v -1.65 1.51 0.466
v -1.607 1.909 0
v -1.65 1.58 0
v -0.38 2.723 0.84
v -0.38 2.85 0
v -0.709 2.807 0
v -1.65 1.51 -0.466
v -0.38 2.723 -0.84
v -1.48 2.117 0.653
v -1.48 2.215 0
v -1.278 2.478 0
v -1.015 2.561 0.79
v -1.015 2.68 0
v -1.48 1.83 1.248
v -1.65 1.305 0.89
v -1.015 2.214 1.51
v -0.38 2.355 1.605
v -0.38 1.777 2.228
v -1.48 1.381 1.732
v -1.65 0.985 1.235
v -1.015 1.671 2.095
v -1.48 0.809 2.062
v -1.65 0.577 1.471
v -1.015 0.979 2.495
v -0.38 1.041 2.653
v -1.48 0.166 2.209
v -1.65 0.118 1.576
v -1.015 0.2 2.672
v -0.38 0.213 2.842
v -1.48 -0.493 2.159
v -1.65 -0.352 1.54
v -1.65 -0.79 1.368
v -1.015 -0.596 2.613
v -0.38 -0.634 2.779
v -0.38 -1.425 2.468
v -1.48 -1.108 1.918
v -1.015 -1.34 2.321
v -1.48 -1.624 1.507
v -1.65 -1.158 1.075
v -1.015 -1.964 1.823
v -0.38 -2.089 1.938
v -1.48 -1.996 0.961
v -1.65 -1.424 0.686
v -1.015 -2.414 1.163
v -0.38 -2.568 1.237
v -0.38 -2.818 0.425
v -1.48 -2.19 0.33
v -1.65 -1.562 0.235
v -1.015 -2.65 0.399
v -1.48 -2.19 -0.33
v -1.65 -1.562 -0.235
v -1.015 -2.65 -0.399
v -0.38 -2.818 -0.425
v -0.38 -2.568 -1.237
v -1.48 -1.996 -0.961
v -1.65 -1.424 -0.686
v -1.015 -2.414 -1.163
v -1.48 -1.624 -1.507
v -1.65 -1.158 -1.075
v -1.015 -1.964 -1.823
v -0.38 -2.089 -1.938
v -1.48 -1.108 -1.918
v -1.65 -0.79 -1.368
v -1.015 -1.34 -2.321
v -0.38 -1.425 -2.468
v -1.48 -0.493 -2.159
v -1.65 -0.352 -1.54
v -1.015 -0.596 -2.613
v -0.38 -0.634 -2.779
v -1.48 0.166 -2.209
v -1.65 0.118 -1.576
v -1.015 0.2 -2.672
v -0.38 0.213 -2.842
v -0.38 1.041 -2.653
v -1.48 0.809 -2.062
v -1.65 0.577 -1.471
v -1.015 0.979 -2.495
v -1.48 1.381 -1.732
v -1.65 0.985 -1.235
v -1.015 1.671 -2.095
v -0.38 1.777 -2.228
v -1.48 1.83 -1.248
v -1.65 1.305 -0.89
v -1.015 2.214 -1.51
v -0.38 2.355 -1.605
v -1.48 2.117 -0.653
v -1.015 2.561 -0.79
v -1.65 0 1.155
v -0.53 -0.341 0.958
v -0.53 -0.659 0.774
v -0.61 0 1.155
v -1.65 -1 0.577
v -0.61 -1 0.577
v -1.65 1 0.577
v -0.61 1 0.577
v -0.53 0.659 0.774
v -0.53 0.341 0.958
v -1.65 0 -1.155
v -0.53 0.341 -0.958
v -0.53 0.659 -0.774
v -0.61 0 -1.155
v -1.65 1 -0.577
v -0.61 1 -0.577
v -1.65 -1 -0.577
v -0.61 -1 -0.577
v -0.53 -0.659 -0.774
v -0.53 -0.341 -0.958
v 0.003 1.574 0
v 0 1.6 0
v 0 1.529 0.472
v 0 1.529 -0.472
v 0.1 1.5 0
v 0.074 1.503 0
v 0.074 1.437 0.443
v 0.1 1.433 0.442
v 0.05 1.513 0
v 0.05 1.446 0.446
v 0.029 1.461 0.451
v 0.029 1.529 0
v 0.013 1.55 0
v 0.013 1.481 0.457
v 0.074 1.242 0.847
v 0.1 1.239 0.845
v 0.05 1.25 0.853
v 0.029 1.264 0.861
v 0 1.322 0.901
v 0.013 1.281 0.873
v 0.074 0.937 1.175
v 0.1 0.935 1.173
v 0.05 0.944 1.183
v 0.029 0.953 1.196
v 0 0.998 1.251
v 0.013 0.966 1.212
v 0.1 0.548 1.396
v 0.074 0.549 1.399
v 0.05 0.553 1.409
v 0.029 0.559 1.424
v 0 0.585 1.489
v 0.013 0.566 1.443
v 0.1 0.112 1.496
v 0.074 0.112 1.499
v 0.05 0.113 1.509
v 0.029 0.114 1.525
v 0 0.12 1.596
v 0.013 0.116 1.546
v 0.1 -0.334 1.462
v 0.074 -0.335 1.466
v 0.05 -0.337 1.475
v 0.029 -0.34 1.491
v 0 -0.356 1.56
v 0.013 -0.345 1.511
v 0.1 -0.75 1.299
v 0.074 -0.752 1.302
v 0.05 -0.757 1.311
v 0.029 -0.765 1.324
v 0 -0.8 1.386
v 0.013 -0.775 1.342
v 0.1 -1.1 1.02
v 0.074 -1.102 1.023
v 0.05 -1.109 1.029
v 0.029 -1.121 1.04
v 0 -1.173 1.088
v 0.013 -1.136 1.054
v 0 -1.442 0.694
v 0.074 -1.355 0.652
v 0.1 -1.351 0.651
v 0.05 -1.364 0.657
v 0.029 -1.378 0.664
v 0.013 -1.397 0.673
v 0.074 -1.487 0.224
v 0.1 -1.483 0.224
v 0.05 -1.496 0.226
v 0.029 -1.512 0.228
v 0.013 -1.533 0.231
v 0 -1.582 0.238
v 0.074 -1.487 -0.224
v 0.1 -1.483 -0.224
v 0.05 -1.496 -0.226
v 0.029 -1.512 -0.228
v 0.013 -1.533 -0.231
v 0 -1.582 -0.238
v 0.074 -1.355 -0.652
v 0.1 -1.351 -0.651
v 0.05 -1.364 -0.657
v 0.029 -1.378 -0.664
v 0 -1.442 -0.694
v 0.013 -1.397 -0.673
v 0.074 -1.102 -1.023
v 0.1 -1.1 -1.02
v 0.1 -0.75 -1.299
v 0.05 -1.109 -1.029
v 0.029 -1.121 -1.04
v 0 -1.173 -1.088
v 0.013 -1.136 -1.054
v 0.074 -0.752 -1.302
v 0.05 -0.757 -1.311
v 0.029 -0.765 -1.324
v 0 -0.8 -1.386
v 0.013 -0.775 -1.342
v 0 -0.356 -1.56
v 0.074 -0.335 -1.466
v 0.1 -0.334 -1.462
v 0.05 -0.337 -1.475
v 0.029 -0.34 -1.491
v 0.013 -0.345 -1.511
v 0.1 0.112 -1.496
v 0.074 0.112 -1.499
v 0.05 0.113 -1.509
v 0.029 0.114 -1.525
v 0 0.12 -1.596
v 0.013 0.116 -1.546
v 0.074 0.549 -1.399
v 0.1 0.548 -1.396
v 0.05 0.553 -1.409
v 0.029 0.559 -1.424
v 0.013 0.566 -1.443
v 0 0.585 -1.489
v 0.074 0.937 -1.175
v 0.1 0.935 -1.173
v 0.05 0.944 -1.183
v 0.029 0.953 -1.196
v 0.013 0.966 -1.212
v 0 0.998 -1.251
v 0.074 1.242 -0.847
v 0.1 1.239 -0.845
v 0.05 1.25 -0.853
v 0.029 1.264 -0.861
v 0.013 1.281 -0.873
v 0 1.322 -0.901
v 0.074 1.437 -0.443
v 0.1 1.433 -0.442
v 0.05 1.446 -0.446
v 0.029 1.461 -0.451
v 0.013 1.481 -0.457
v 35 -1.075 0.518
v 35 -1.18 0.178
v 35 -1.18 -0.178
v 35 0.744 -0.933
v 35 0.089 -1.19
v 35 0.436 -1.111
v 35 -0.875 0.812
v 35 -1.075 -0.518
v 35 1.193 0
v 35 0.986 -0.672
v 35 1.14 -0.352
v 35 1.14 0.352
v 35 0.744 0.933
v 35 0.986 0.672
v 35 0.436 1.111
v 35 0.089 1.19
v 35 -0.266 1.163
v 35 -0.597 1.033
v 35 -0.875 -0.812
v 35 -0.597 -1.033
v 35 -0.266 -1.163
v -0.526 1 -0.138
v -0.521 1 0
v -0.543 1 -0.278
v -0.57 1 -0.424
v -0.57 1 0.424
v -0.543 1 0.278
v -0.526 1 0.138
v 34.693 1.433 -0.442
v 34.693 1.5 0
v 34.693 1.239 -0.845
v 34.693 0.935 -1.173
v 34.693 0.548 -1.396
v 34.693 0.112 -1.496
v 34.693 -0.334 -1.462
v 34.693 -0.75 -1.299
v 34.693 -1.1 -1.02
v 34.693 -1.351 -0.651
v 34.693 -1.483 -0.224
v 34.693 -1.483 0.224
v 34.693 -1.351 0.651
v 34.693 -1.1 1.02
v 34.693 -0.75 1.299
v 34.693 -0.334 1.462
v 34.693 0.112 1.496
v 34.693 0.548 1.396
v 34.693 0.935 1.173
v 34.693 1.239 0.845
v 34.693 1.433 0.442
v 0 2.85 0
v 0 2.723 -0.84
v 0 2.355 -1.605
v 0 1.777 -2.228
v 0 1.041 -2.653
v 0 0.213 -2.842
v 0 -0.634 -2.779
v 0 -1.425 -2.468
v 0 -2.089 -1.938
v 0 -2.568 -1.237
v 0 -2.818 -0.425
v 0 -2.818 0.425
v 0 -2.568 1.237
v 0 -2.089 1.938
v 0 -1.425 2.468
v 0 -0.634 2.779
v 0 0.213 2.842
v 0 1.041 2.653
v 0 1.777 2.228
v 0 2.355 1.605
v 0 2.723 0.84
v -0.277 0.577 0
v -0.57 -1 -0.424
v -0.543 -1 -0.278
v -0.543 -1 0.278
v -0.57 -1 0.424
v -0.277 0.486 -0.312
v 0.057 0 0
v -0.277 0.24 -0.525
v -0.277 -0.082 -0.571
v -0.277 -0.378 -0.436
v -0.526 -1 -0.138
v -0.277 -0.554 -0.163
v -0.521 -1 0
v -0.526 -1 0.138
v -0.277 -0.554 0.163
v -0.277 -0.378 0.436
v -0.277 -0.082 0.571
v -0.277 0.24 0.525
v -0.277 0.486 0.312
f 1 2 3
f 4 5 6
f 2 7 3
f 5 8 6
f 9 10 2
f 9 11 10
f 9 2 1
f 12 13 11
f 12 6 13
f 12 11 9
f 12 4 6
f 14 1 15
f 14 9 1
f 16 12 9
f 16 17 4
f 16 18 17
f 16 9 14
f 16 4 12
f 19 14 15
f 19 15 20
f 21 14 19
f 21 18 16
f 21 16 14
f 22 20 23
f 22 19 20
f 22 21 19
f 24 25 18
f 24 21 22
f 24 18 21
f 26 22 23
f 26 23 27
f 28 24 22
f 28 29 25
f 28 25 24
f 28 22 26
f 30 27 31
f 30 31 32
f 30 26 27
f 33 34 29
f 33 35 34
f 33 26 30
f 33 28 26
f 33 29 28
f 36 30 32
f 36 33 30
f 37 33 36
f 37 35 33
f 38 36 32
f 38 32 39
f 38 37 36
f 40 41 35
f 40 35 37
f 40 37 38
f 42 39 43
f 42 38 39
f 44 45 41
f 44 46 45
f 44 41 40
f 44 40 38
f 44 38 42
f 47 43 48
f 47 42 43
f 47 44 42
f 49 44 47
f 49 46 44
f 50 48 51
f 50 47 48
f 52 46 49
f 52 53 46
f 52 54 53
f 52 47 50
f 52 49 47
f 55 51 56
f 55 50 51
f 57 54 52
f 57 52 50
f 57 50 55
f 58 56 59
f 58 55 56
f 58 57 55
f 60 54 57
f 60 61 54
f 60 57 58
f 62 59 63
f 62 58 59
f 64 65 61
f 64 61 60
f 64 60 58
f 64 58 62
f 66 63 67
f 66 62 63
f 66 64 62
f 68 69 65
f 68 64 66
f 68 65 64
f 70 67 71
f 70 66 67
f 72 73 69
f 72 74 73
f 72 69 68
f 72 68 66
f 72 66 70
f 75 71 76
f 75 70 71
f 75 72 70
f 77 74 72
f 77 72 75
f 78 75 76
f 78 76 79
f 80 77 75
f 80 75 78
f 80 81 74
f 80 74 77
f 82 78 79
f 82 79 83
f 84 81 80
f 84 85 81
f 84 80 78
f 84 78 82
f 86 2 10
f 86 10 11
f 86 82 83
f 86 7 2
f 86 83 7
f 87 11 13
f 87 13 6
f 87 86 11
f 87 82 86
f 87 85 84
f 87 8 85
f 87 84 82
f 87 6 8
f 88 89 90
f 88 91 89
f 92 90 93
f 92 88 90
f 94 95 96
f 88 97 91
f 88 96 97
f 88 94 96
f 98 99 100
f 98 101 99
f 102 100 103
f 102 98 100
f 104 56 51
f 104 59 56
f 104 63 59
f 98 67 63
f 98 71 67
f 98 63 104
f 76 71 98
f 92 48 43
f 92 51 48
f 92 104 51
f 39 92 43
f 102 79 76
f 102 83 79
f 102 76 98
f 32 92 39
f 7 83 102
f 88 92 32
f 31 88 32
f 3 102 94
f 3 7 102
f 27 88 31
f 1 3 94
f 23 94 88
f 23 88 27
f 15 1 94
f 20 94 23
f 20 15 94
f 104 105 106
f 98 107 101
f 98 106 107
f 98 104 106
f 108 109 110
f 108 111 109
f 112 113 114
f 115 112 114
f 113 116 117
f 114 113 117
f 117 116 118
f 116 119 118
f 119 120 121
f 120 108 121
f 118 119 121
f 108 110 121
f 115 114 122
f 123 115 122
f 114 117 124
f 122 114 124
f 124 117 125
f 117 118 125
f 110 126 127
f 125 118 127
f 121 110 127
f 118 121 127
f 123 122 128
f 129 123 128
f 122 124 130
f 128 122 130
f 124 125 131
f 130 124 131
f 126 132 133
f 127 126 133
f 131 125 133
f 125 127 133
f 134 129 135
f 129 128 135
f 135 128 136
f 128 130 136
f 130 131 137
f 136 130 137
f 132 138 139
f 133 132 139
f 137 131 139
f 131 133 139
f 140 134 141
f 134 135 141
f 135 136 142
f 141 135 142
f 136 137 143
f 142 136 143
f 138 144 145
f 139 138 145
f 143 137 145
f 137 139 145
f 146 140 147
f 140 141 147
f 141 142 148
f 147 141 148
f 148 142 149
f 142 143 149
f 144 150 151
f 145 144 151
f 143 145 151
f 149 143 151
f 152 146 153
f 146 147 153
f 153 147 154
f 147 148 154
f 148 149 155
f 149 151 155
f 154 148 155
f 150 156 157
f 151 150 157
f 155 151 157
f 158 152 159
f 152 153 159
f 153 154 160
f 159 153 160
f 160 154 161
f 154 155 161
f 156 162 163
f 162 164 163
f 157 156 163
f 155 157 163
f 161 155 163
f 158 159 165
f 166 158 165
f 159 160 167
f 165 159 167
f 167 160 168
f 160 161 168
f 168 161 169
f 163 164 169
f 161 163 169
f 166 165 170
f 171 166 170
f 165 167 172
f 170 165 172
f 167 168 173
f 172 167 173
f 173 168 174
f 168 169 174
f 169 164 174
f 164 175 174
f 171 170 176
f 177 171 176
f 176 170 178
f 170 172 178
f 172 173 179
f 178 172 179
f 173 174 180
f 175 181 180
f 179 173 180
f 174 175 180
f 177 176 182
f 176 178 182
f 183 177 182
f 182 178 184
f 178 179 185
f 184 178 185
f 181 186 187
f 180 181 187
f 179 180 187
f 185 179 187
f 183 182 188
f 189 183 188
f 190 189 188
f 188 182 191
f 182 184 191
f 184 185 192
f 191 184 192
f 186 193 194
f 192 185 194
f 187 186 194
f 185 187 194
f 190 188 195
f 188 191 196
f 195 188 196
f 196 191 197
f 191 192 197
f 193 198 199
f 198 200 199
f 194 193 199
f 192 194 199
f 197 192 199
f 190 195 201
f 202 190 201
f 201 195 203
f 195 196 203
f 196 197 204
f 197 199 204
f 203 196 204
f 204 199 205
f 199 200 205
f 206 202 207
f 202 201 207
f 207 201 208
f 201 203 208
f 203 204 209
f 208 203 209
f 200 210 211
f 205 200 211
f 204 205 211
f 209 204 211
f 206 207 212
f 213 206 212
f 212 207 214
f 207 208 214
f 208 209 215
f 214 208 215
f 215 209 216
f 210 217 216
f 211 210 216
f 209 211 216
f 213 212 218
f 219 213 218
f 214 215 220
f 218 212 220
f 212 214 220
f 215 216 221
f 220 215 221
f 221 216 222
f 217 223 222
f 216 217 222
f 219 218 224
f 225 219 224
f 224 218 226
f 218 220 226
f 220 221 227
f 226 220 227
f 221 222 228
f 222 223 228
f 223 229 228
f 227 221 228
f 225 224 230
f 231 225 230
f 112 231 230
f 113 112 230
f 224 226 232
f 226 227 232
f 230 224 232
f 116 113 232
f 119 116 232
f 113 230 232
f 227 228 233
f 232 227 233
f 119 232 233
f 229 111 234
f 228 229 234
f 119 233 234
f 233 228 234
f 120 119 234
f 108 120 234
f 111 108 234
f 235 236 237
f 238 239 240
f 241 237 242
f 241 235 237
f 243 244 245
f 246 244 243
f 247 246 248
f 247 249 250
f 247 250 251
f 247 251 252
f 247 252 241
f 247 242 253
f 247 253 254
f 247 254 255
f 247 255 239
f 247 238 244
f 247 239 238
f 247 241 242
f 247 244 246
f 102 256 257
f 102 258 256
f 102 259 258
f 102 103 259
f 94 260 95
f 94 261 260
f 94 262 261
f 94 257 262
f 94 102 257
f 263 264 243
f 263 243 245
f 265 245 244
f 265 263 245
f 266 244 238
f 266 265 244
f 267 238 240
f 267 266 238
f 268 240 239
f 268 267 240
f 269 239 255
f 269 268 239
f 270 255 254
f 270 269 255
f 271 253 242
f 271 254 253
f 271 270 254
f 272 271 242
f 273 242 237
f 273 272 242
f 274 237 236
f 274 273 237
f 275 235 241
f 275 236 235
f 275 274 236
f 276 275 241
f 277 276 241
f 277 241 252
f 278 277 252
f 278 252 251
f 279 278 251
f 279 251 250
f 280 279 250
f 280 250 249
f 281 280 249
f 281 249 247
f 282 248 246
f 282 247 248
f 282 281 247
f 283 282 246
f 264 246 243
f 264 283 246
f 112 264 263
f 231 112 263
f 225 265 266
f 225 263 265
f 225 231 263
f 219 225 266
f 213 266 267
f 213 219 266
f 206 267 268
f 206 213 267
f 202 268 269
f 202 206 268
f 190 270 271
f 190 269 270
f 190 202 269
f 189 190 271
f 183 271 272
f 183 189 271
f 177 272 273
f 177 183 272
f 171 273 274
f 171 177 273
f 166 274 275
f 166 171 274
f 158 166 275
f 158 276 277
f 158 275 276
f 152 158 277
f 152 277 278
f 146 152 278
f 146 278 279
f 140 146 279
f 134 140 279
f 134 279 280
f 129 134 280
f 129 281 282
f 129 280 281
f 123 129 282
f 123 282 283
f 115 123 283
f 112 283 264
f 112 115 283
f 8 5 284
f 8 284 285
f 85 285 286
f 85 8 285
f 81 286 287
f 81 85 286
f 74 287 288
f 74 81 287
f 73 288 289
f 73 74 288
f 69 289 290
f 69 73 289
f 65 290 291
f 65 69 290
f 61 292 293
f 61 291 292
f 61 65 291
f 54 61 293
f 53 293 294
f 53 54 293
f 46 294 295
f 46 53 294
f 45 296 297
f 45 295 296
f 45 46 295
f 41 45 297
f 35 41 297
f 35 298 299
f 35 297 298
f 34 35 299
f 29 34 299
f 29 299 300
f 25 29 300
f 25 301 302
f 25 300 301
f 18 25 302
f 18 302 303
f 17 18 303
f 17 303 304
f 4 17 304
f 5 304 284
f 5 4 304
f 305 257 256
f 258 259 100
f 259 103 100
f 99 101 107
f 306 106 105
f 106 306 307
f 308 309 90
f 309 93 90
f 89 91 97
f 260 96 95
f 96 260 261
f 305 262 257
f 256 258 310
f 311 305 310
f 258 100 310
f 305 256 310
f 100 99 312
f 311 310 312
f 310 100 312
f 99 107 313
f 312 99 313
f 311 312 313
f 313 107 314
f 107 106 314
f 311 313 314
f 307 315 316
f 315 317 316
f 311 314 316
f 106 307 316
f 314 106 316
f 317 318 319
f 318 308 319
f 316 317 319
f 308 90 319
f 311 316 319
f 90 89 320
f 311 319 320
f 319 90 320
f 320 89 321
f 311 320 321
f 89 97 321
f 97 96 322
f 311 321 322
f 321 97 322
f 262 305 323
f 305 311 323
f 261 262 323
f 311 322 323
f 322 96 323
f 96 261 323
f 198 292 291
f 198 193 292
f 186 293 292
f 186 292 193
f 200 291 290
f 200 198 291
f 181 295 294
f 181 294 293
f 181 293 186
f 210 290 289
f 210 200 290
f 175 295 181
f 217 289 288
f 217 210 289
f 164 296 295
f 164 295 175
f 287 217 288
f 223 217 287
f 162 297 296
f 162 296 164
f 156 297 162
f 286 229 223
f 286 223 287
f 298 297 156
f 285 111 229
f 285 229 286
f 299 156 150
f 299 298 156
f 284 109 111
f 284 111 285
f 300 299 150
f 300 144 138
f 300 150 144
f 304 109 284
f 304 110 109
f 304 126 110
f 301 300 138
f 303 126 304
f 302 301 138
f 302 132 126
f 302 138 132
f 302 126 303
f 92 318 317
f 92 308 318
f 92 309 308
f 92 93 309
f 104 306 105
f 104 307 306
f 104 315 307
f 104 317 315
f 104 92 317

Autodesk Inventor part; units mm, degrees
ref_plane "YZ Plane" through (0, 0, 0) normal (1, 0, 0) x (0, 1, 0)
ref_plane "XZ Plane" through (0, 0, 0) normal (0, 1, 0) x (-1, 0, 0)
sketch "Sketch1" plane through (0, 0, 0) normal (0, 0, 1) x (1, 0, 0)
  line L0 (0.0567, 0) -> (35, 0)
  line L1 (35, 0) -> (35, 1.5)
  line L2 (35, 1.5) -> (1, 1.5)
  line L3 (1, 1.5) -> (0.6933, 1.5)
  line L4 (0.6933, 1.5) -> (0, 1.5)
  line L5 (0, 1.5) -> (0, 2.85)
  line L6 (0, 2.85) -> (-1.65, 2.85)
  line L7 (-1.65, 2.85) -> (-1.65, 1.1547)
  line L8 (-1.65, 1.1547) -> (-0.61, 1.1547)
  line L9 (-0.61, 1.1547) -> (0.0567, 0)
  line L10 (-8.98, 0) -> (42.33, 0) projected
  line L11 (0, -0.57) -> (0, 3.42) projected
  line L12 (1, 1.5) -> (0, 1.5) construction
  dimension "d0" = 34
  dimension "d1" = 0.3067
  dimension "d2" = 1.65
  dimension "d3" = 1.04
  dimension "d4" = 60
  dimension "d5" = 3
  dimension "d6" = 3
  dimension "d7" = 2.3094
  dimension "d8" = 5.7
  dimension "d19" = 35
revolve "Body" add sketch "Sketch1" angle 360 about axis through (0.0567, 0, 0) along (1, 0, 0) contours L9 L11 L4 L3 L2 L1 L0 | L9 L8 L7 L6 L5 L11
sketch "Sketch2" plane through (-1.65, 0, 0) normal (-1, 0, 0) x (0, 0, 1)
  circle A0 centre (0, 0) radius 1.1547 projected
  line L0 (0, -3.99) -> (0, 3.99) projected
  line L1 (-3.99, 0) -> (3.99, 0) projected
  line L2 (1.1547, 0) -> (0.5774, -1)
  line L3 (0.5774, -1) -> (-0.5774, -1)
  line L4 (-0.5774, -1) -> (-1.1547, 0)
  line L5 (-1.1547, 0) -> (-0.5774, 1)
  line L6 (-0.5774, 1) -> (0.5774, 1)
  line L7 (0.5774, 1) -> (1.1547, 0)
extrude "Slot" add sketch "Sketch2" against normal up to next contours L7 A0 | A0 L2 | L6 L0 A0 | A0 L0 L3 | L0 L6 A0 | A0 L3 L0 | L4 A0 | A0 L5
fillet "Fillet1" radius 1.27 1 edges at (-1.65, -2.85, 0)
thread "Thread" size "M3x0.5" class "4g6g" standard "ANSI Metric M Profile" length 34
chamfer "Chamfer1" distance 0.3067 distance2 0.3067 1 edges at (35, -1.5, 0) measured on face at (35, -0.8773, -0.3972)
fillet "Fillet2" radius 0.1 1 edges at (0, -1.5, 0)
ref_plane "Work Plane1" through (30, 0, 0) normal (0, -0.5, 0.866) x (1, 0, 0)
equation "\"d16\" = RR"
equation "\"d12\" = GEL"
equation "\"d14\" = -0.5 * SPD + 0.5 * GD"
equation "\"d15\" = GUL"
equation "\"d29\" = R"
equation "\"d0\" = GEL"
equation "\"d1\" = GAL"
equation "\"d2\" = KOH"
equation "\"d3\" = INTI"
equation "\"d5\" = GD"
equation "\"d6\" = BDM"
equation "\"d7\" = 1.1547 * SW"
equation "\"d8\" = KOD"
equation "\"d19\" = NLG"
equation "\"GD\" = NND"
equation "\"NLG\" = 35"
equation "\"GEL\" = 34"
equation "\"KOD\" = 5.7"
equation "\"KOH\" = 1.65"
equation "\"INTI\" = 1.04"
equation "\"GAL\" = 0.61345 * PTC"
equation "\"GUL\" = 0.61345 * PTC"
equation "\"BDM\" = NND"
equation "\"SW\" = 2"
equation "\"RR\" = 1.27"
equation "\"SPD\" = 2.38655"
equation "\"d28\" = R"
equation "\"R\" = 0.1"
equation "\"TOA\" = 30deg"
equation "\"THREADDIA\" = 3"
equation "\"KOD1\" = KOD - 2 * RR"
equation "\"PTC\" = 0.5"
equation "\"NND\" = 3"
equation "\"E0\" = 1.155 * SW"
equation "\"GD1\" = THREADDIA - 1.2269 * PTC"
properties part number "ANSI B18.3.4M - M3 x 0.5 x 35, FHSBHCSM" material "Steel, Mild"
